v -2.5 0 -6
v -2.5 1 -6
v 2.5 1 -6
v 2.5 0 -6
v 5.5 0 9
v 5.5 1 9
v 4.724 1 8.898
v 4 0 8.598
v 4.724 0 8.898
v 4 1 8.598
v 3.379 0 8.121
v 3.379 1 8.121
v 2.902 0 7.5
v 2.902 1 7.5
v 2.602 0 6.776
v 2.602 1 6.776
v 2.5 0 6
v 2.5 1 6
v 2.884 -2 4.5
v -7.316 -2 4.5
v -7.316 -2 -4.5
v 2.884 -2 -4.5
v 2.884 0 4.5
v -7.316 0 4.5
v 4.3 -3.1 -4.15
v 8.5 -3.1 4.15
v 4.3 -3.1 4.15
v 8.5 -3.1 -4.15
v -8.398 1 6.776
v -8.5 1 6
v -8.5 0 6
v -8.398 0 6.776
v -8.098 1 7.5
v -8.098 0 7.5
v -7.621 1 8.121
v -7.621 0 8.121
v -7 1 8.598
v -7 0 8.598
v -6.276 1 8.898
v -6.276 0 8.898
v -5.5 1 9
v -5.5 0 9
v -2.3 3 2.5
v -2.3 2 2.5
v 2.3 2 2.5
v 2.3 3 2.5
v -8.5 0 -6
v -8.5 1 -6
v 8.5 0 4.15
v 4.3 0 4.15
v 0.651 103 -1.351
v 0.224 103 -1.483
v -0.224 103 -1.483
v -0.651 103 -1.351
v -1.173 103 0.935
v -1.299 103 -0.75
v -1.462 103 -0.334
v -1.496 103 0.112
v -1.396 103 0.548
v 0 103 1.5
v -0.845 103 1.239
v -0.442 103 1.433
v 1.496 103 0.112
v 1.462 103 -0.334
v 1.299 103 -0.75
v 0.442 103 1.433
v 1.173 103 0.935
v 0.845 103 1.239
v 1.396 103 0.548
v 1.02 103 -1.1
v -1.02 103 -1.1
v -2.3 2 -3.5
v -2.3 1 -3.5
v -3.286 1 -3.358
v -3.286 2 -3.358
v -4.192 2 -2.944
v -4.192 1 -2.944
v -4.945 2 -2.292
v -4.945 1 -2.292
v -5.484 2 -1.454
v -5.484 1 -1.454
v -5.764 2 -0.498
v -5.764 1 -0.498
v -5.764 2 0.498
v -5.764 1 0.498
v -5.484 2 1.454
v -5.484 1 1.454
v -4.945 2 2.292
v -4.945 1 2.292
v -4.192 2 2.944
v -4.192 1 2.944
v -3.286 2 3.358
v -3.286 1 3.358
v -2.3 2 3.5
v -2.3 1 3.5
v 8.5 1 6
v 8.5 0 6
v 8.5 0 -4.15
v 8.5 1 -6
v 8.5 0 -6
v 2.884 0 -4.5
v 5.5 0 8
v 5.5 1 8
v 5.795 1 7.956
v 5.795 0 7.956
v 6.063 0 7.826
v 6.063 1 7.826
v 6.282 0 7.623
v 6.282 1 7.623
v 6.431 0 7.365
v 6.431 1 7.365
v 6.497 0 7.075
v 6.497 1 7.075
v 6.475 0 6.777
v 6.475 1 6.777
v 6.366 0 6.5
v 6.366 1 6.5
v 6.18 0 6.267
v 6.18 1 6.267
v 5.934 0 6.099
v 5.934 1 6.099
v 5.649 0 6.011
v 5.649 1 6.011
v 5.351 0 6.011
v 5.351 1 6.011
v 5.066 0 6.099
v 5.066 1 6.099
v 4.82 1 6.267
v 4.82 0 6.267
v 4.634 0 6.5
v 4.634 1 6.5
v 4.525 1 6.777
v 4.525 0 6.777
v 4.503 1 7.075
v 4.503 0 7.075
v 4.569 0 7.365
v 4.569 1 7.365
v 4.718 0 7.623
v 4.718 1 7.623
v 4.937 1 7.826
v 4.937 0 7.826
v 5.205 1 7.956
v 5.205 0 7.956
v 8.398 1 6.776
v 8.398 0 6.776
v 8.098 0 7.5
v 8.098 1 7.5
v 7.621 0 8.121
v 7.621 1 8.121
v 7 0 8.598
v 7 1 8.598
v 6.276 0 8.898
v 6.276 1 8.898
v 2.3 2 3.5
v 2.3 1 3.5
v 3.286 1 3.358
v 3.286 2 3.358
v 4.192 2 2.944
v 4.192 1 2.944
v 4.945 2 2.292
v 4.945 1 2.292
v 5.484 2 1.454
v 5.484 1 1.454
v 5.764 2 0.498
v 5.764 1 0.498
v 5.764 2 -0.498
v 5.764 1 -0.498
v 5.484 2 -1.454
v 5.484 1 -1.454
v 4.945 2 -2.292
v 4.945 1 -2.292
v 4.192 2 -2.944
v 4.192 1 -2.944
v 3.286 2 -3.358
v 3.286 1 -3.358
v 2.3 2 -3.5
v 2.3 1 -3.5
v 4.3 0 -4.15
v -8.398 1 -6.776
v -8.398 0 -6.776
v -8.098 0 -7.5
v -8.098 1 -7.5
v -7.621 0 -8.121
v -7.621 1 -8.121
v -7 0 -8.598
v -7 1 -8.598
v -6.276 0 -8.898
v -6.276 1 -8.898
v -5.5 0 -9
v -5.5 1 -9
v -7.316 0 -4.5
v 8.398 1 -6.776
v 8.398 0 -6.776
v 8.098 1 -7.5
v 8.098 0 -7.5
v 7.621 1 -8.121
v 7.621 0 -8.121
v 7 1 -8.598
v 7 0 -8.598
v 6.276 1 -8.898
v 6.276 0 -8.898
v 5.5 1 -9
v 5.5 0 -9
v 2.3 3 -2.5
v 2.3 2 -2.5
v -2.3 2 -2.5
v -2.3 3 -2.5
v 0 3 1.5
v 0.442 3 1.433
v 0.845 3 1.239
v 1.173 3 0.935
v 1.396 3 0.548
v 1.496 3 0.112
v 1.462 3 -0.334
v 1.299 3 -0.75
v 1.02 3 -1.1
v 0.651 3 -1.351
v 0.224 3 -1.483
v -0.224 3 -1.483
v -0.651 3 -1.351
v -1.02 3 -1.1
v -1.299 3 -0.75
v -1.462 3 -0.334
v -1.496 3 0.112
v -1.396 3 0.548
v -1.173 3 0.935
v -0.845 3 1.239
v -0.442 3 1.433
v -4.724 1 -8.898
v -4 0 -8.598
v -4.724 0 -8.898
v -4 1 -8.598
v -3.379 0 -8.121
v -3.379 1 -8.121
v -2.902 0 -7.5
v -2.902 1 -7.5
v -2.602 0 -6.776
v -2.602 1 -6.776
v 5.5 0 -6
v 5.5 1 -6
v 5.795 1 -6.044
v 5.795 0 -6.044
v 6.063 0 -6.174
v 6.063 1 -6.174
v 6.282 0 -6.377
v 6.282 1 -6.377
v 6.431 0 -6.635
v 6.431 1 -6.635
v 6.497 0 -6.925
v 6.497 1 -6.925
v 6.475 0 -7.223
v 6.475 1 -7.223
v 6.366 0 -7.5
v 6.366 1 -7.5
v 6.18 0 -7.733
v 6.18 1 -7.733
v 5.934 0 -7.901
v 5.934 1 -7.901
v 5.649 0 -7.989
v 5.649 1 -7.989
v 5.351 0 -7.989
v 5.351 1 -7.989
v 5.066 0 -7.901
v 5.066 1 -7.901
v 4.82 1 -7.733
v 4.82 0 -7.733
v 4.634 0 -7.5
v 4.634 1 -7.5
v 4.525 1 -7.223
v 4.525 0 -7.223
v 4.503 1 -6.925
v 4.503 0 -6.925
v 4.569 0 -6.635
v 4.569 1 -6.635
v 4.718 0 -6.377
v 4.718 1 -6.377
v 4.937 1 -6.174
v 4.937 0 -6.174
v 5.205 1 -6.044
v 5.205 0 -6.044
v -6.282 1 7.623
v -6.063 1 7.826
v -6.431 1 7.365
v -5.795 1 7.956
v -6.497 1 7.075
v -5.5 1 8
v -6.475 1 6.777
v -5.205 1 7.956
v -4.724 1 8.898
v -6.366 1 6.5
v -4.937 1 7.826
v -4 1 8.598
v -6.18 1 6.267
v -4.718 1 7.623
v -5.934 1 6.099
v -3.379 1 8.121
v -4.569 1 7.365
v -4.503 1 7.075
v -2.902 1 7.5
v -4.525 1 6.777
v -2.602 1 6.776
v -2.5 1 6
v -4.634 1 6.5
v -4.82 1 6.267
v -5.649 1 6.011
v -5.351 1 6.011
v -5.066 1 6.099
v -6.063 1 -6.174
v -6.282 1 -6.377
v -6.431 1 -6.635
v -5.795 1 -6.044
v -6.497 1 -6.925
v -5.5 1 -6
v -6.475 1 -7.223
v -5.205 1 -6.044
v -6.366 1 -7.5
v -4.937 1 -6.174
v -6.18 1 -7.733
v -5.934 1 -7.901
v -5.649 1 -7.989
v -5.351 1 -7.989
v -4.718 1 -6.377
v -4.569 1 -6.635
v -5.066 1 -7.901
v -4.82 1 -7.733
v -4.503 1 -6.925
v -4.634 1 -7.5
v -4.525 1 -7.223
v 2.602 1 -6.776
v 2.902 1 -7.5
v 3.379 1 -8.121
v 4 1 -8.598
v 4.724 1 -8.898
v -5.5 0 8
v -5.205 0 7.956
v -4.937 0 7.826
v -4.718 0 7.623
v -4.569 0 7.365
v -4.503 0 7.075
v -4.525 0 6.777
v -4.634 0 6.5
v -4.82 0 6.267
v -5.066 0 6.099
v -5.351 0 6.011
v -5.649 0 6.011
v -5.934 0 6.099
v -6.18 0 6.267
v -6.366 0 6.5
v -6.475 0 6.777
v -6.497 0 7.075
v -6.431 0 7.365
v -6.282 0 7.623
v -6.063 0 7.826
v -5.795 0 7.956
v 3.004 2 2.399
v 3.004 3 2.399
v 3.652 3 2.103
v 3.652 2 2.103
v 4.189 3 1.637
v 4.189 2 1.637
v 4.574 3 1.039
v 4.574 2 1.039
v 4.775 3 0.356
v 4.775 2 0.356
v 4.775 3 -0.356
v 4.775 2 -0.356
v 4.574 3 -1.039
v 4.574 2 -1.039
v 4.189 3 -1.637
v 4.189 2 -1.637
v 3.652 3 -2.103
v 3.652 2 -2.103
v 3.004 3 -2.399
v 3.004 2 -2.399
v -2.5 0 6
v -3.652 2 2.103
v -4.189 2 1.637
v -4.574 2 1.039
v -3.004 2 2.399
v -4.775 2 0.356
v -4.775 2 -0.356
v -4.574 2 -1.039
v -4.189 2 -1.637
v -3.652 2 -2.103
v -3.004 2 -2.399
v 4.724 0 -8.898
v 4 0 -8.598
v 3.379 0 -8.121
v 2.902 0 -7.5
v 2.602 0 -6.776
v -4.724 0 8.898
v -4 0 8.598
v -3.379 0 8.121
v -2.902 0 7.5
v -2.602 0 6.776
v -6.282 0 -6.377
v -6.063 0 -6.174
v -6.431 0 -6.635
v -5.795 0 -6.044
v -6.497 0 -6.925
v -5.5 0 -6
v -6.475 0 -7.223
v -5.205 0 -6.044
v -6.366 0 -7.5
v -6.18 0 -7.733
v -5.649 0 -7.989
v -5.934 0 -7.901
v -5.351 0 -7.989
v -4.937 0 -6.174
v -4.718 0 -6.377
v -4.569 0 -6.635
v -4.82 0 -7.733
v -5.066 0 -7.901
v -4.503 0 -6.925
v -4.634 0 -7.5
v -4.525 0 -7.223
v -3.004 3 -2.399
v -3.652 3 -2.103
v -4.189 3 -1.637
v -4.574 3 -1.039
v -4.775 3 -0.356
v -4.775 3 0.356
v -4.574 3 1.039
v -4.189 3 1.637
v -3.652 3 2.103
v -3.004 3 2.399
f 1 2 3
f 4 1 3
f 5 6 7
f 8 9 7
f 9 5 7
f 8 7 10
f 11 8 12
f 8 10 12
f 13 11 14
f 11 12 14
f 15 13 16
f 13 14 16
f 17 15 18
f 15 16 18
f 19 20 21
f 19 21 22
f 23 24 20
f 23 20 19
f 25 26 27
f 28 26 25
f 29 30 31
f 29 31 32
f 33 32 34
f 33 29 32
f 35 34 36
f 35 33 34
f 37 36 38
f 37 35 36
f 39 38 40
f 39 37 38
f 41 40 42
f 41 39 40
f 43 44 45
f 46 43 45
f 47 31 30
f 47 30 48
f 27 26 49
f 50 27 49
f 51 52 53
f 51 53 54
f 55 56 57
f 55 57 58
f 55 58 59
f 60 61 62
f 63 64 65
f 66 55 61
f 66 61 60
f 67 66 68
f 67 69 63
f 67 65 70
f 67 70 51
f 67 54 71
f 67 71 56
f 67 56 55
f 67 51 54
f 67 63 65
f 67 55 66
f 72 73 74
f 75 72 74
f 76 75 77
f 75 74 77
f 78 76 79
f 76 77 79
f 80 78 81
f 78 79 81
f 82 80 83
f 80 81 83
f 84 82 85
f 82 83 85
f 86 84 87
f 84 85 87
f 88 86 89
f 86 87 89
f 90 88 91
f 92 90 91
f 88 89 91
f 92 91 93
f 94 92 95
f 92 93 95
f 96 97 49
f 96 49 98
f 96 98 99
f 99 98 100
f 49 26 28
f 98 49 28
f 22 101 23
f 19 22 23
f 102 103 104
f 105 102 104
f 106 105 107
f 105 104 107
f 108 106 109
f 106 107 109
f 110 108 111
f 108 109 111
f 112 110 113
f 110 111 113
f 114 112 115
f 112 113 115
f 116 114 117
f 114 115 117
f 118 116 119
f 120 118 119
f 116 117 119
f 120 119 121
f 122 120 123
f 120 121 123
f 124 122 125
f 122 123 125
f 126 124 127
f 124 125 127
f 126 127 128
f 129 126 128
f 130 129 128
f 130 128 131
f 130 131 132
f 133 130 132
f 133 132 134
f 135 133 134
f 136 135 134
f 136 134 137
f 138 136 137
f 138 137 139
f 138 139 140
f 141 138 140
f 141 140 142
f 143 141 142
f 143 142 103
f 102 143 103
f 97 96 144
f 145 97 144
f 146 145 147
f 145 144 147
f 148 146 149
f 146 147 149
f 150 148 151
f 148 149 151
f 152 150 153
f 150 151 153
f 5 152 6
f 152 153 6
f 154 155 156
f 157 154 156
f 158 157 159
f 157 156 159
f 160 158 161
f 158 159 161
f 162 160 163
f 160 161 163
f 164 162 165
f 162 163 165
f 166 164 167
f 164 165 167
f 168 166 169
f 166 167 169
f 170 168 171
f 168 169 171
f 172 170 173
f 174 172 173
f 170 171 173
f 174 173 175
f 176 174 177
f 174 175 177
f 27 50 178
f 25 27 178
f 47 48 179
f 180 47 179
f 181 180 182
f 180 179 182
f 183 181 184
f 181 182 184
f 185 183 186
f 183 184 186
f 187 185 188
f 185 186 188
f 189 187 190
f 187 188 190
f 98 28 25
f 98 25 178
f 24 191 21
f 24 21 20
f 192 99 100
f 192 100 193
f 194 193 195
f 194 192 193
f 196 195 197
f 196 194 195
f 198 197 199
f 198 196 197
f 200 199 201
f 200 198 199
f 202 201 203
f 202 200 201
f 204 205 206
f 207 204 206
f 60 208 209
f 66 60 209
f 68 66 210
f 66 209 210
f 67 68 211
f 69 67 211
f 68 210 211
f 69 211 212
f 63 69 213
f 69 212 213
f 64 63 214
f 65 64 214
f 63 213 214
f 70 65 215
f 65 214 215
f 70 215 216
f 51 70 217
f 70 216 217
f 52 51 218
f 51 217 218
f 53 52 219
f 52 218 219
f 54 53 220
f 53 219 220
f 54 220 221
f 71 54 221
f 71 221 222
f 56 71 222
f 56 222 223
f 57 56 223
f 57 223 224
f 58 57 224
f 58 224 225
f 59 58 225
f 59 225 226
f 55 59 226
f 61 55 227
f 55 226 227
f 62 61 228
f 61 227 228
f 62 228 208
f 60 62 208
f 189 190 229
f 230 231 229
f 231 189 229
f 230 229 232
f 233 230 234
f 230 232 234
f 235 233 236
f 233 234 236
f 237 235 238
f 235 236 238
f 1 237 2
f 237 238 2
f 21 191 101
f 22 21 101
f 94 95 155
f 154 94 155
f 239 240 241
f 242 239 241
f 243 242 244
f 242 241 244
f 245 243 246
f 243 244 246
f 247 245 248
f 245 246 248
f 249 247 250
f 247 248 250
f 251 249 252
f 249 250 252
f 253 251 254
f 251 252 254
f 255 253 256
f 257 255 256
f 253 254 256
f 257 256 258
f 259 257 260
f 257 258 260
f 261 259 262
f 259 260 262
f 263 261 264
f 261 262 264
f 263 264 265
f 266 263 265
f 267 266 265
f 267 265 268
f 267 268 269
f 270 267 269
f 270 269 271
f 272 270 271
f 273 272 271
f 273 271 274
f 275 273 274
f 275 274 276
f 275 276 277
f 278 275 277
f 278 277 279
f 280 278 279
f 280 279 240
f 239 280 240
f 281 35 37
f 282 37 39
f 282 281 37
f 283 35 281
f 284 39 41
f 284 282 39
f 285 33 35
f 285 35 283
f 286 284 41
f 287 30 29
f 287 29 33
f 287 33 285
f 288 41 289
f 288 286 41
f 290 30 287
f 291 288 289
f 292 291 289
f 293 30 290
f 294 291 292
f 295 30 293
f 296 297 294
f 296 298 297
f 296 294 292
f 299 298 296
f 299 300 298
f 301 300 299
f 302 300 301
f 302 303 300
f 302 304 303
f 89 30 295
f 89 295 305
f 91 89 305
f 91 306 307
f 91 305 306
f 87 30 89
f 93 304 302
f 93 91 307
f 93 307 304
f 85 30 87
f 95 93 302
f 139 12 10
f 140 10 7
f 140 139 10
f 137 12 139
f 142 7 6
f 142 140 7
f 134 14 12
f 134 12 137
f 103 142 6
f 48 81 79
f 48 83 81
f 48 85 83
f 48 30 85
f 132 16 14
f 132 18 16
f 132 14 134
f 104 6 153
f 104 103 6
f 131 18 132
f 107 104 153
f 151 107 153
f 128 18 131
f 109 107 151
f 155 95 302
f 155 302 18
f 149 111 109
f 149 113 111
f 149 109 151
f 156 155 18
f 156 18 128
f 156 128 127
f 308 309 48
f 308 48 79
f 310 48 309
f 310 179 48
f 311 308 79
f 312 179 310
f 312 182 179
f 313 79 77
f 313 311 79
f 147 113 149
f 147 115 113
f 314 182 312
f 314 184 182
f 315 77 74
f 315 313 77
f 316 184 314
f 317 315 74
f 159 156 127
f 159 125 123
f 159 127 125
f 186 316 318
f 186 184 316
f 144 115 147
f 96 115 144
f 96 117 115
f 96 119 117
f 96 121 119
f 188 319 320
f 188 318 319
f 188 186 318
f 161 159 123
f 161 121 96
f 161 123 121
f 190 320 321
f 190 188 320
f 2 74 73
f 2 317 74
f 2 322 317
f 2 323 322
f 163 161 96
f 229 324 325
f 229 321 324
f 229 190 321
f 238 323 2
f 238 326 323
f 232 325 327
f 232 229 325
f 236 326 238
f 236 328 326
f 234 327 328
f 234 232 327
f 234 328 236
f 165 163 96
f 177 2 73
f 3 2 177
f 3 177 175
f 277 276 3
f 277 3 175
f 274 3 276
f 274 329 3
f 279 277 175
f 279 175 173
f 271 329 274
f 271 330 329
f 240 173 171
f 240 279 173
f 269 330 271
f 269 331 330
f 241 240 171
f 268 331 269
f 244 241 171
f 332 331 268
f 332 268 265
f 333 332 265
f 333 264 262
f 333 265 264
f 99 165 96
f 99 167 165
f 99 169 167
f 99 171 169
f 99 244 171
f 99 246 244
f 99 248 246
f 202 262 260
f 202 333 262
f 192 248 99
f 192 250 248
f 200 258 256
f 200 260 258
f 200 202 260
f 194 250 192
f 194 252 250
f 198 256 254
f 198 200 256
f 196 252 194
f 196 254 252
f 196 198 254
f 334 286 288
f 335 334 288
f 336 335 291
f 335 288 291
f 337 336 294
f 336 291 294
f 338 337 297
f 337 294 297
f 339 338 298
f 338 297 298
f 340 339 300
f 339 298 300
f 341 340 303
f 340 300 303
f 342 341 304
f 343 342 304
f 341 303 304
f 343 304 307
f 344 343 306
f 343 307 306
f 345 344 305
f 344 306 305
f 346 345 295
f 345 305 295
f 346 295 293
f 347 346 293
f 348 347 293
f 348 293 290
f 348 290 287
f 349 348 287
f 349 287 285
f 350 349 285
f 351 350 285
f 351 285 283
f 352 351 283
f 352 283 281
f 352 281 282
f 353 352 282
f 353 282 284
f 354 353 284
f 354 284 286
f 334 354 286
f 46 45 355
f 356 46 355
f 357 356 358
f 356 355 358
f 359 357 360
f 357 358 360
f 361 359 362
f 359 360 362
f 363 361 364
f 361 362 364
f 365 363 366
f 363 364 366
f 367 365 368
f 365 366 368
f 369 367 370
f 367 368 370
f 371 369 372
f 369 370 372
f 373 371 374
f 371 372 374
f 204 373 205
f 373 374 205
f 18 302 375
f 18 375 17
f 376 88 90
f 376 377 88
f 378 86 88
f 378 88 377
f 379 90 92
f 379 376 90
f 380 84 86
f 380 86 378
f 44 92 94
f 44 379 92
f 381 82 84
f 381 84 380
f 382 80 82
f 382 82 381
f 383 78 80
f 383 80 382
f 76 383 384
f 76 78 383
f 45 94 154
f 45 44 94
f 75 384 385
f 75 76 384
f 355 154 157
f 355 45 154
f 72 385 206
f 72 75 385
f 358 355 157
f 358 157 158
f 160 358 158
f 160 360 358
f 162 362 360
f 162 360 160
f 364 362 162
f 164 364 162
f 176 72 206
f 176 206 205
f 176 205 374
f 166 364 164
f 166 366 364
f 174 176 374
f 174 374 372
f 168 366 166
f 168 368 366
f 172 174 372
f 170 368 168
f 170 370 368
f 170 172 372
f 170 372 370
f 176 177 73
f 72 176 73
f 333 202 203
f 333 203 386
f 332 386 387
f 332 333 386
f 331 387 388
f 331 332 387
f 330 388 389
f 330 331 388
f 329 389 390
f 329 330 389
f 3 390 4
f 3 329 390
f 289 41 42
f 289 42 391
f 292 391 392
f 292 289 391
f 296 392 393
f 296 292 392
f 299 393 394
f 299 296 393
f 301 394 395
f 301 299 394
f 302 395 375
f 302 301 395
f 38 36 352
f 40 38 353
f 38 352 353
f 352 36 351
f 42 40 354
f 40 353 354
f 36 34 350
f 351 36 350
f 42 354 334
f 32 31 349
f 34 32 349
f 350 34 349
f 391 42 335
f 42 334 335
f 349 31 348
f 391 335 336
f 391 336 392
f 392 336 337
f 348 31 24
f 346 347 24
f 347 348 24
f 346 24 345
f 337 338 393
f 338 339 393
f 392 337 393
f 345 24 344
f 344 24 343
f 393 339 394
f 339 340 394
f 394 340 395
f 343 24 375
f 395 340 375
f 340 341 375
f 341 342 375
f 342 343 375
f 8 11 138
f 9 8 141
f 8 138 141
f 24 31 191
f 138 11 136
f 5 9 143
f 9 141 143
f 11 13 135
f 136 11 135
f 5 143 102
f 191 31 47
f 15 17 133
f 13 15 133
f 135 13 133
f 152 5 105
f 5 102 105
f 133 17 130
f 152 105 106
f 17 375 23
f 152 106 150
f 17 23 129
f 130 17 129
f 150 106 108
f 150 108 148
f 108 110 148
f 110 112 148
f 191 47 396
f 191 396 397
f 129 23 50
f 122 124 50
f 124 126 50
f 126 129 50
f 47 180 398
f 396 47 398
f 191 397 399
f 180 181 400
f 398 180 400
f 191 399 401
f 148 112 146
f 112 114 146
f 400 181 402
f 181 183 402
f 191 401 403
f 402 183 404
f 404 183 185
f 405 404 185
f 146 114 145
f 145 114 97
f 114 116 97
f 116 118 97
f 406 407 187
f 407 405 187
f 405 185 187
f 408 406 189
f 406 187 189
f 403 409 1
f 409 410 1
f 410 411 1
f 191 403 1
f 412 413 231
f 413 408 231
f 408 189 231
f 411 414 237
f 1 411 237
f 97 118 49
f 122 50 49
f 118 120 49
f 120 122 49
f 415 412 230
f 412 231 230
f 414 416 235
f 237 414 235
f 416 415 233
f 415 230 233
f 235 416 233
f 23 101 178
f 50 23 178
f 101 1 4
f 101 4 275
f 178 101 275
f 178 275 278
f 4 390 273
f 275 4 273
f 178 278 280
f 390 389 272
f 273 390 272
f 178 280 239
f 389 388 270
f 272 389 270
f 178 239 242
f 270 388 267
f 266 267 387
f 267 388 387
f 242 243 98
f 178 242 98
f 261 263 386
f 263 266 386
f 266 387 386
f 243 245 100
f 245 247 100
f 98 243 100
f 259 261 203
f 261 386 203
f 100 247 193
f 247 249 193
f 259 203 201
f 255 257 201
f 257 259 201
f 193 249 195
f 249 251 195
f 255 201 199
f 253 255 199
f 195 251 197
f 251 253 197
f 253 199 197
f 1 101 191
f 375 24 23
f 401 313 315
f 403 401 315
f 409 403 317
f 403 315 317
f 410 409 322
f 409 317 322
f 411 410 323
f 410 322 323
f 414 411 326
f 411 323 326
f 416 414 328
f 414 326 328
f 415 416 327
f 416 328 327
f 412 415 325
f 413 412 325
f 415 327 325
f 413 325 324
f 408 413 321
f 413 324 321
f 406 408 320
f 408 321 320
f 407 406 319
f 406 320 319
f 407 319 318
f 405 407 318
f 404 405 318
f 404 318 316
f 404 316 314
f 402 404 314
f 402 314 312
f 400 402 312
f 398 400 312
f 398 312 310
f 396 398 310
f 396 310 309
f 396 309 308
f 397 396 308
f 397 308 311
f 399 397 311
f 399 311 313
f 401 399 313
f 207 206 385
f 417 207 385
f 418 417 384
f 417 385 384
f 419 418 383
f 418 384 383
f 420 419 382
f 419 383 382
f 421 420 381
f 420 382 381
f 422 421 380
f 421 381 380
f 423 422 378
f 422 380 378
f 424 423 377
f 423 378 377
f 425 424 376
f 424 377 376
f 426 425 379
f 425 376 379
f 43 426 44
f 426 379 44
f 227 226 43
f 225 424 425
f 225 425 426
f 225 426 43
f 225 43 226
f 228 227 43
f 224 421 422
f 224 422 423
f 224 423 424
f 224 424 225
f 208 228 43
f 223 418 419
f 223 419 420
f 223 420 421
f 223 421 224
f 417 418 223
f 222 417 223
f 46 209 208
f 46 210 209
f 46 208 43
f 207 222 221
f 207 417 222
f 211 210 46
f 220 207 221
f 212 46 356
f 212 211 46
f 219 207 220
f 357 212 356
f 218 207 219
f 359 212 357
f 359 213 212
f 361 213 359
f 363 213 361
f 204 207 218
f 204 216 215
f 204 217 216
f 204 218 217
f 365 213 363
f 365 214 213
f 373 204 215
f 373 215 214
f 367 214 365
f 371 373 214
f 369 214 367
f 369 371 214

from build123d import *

# Parameters (mm, degrees)
SKETCH_1_W            = 17
SKETCH_1_H            = 18
EXTRUDE_1_DEPTH       = 1
SKETCH_2_R            = 1
CUT_EXTRUDE_1_DEPTH   = 13.419742348
CUT_EXTRUDE_2_DEPTH   = 13.419742348
MIRROR_2_COPY_1_DEPTH = 13.419742348
SKETCH_4_W            = 5
SKETCH_4_H            = 3
CUT_EXTRUDE_3_DEPTH   = 13.419742348
EXTRUDE_2_DEPTH       = 1
EXTRUDE_3_DEPTH       = 1
EXTRUDE_START         = 8.5
SKETCH_8_W            = 8.3
SKETCH_8_H            = 3.1
EXTRUDE_4_DEPTH       = 4.2
SKETCH_9_W            = 10.2
SKETCH_9_H            = 9
EXTRUDE_5_DEPTH       = 2
SKETCH_10_R           = 1.5
EXTRUDE_10_DEPTH      = 100


with BuildPart() as part:
    # 草图1 → 凸台-拉伸1 (new body)
    with BuildSketch(Plane(origin=(0, 0, 0), x_dir=(1, 0, 0), z_dir=(0, 1, 0))):
        Rectangle(SKETCH_1_W, SKETCH_1_H)
    extrude(amount=EXTRUDE_1_DEPTH)

    # 草图2 → 切除-拉伸1 (cut, through all)
    with BuildSketch(Plane(origin=(0, 1, 0), x_dir=(1, 0, 0), z_dir=(0, 1, 0))):
        with Locations(Location((-5.5, 7, 0), (0, 0, 270))):
            Circle(SKETCH_2_R)
        with Locations(Location((5.5, 7, 0), (0, 0, 270))):
            Circle(SKETCH_2_R)
        with Locations(Location((-5.5, -7, 0), (0, 0, 270))):
            Circle(SKETCH_2_R)
        with Locations(Location((5.5, -7, 0), (0, 0, 270))):
            Circle(SKETCH_2_R)
    extrude(amount=-CUT_EXTRUDE_1_DEPTH, mode=Mode.SUBTRACT)

    # 草图3 → 切除-拉伸2 (cut, through all)
    with BuildSketch(Plane(origin=(0, 1, 0), x_dir=(1, 0, 0), z_dir=(0, 1, 0))):
        with BuildLine():
            Line((-8.5, 9), (-8.5, 6))
            ThreePointArc((-8.5, 6), (-7.621320346, 8.121320341), (-5.500000007, 9))
            Line((-5.500000007, 9), (-8.5, 9))
        make_face()
        with BuildLine():
            Line((-2.5, 9), (-5.500000007, 9))
            ThreePointArc((-5.500000007, 9), (-3.378679659, 8.121320346), (-2.5, 6))
            Line((-2.5, 6), (-2.5, 9))
        make_face()
    cut_extrude_2 = extrude(amount=-CUT_EXTRUDE_2_DEPTH, mode=Mode.SUBTRACT)

    # 镜向1: 切除-拉伸2 across plane
    add(cut_extrude_2.mirror(Plane.XY), mode=Mode.SUBTRACT)

    # 镜向2: 切除-拉伸2 across plane
    add(cut_extrude_2.mirror(Plane(origin=(0, 0, 0), x_dir=(0, 0, 1), z_dir=(1, 0, 0))), mode=Mode.SUBTRACT)

    # 镜向2 copy 1 sketch → 镜向2 copy 1 (cut, through all)
    with BuildSketch(Plane(origin=(0, 1, 0), x_dir=(-1, 0, 0), z_dir=(0, 1, 0))):
        with BuildLine():
            Line((-8.5, 9), (-8.5, 6))
            ThreePointArc((-8.5, 6), (-7.621320346, 8.121320341), (-5.500000007, 9))
            Line((-5.500000007, 9), (-8.5, 9))
        make_face()
        with BuildLine():
            Line((-2.5, 9), (-5.500000007, 9))
            ThreePointArc((-5.500000007, 9), (-3.378679659, 8.121320346), (-2.5, 6))
            Line((-2.5, 6), (-2.5, 9))
        make_face()
    extrude(amount=-MIRROR_2_COPY_1_DEPTH, mode=Mode.SUBTRACT)

    # 草图4 → 切除-拉伸3 (cut, through all)
    with BuildSketch(Plane(origin=(0, 1, 0), x_dir=(1, 0, 0), z_dir=(0, 1, 0))):
        with Locations((0, 7.5)):
            Rectangle(SKETCH_4_W, SKETCH_4_H)
    cut_extrude_3 = extrude(amount=-CUT_EXTRUDE_3_DEPTH, mode=Mode.SUBTRACT)

    # 镜向3: 切除-拉伸3 across plane
    add(cut_extrude_3.mirror(Plane.XY), mode=Mode.SUBTRACT)

    # 草图5 → 凸台-拉伸2 (add)
    with BuildSketch(Plane(origin=(0, 1, 0), x_dir=(1, 0, 0), z_dir=(0, 1, 0))):
        with BuildLine():
            Line((0, 0), (-2.3, 3.5))
            ThreePointArc((-2.3, 3.5), (-5.8, 0), (-2.3, -3.5))
            Line((-2.3, -3.5), (0, 0))
        make_face()
        Polygon((2.3, 3.5), (-2.3, 3.5), (0, 0), align=None)
        Polygon((2.3, -3.5), (0, 0), (-2.3, -3.5), align=None)
        with BuildLine():
            ThreePointArc((2.3, -3.5), (5.8, 0), (2.3, 3.5))
            Line((2.3, 3.5), (0, 0))
            Line((0, 0), (2.3, -3.5))
        make_face()
    extrude(amount=EXTRUDE_2_DEPTH)

    # 草图6 → 凸台-拉伸3 (add)
    with BuildSketch(Plane(origin=(0, 2, 0), x_dir=(1, 0, 0), z_dir=(0, 1, 0))):
        with BuildLine():
            Line((0, 0), (-2.3, 2.5))
            ThreePointArc((-2.3, 2.5), (-4.8, 0), (-2.3, -2.5))
            Line((-2.3, -2.5), (0, 0))
        make_face()
        Polygon((2.3, 2.5), (-2.3, 2.5), (0, 0), align=None)
        Polygon((2.3, -2.5), (0, 0), (-2.3, -2.5), align=None)
        with BuildLine():
            ThreePointArc((2.3, -2.5), (4.8, 0), (2.3, 2.5))
            Line((2.3, 2.5), (0, 0))
            Line((0, 0), (2.3, -2.5))
        make_face()
    extrude(amount=EXTRUDE_3_DEPTH)

    # 草图8 → 凸台-拉伸4 (add)
    with BuildSketch(Plane(origin=(0, 0, 0), x_dir=(0, 0, -1), z_dir=(1, 0, 0)).offset(EXTRUDE_START)):
        with Locations((0, -1.55)):
            Rectangle(SKETCH_8_W, SKETCH_8_H)
    extrude(amount=-EXTRUDE_4_DEPTH)

    # 草图9 → 凸台-拉伸5 (add)
    with BuildSketch(Plane.XZ):
        with Locations((-2.21638326, 0)):
            Rectangle(SKETCH_9_W, SKETCH_9_H)
    extrude(amount=EXTRUDE_5_DEPTH)

    # 草图10 → 凸台-拉伸10 (add)
    with BuildSketch(Plane(origin=(0, 3, 0), x_dir=(1, 0, 0), z_dir=(0, 1, 0))):
        with Locations(Location((0, 0, 0), (0, 0, 270))):
            Circle(SKETCH_10_R)
    extrude(amount=EXTRUDE_10_DEPTH)


solid = part.part
